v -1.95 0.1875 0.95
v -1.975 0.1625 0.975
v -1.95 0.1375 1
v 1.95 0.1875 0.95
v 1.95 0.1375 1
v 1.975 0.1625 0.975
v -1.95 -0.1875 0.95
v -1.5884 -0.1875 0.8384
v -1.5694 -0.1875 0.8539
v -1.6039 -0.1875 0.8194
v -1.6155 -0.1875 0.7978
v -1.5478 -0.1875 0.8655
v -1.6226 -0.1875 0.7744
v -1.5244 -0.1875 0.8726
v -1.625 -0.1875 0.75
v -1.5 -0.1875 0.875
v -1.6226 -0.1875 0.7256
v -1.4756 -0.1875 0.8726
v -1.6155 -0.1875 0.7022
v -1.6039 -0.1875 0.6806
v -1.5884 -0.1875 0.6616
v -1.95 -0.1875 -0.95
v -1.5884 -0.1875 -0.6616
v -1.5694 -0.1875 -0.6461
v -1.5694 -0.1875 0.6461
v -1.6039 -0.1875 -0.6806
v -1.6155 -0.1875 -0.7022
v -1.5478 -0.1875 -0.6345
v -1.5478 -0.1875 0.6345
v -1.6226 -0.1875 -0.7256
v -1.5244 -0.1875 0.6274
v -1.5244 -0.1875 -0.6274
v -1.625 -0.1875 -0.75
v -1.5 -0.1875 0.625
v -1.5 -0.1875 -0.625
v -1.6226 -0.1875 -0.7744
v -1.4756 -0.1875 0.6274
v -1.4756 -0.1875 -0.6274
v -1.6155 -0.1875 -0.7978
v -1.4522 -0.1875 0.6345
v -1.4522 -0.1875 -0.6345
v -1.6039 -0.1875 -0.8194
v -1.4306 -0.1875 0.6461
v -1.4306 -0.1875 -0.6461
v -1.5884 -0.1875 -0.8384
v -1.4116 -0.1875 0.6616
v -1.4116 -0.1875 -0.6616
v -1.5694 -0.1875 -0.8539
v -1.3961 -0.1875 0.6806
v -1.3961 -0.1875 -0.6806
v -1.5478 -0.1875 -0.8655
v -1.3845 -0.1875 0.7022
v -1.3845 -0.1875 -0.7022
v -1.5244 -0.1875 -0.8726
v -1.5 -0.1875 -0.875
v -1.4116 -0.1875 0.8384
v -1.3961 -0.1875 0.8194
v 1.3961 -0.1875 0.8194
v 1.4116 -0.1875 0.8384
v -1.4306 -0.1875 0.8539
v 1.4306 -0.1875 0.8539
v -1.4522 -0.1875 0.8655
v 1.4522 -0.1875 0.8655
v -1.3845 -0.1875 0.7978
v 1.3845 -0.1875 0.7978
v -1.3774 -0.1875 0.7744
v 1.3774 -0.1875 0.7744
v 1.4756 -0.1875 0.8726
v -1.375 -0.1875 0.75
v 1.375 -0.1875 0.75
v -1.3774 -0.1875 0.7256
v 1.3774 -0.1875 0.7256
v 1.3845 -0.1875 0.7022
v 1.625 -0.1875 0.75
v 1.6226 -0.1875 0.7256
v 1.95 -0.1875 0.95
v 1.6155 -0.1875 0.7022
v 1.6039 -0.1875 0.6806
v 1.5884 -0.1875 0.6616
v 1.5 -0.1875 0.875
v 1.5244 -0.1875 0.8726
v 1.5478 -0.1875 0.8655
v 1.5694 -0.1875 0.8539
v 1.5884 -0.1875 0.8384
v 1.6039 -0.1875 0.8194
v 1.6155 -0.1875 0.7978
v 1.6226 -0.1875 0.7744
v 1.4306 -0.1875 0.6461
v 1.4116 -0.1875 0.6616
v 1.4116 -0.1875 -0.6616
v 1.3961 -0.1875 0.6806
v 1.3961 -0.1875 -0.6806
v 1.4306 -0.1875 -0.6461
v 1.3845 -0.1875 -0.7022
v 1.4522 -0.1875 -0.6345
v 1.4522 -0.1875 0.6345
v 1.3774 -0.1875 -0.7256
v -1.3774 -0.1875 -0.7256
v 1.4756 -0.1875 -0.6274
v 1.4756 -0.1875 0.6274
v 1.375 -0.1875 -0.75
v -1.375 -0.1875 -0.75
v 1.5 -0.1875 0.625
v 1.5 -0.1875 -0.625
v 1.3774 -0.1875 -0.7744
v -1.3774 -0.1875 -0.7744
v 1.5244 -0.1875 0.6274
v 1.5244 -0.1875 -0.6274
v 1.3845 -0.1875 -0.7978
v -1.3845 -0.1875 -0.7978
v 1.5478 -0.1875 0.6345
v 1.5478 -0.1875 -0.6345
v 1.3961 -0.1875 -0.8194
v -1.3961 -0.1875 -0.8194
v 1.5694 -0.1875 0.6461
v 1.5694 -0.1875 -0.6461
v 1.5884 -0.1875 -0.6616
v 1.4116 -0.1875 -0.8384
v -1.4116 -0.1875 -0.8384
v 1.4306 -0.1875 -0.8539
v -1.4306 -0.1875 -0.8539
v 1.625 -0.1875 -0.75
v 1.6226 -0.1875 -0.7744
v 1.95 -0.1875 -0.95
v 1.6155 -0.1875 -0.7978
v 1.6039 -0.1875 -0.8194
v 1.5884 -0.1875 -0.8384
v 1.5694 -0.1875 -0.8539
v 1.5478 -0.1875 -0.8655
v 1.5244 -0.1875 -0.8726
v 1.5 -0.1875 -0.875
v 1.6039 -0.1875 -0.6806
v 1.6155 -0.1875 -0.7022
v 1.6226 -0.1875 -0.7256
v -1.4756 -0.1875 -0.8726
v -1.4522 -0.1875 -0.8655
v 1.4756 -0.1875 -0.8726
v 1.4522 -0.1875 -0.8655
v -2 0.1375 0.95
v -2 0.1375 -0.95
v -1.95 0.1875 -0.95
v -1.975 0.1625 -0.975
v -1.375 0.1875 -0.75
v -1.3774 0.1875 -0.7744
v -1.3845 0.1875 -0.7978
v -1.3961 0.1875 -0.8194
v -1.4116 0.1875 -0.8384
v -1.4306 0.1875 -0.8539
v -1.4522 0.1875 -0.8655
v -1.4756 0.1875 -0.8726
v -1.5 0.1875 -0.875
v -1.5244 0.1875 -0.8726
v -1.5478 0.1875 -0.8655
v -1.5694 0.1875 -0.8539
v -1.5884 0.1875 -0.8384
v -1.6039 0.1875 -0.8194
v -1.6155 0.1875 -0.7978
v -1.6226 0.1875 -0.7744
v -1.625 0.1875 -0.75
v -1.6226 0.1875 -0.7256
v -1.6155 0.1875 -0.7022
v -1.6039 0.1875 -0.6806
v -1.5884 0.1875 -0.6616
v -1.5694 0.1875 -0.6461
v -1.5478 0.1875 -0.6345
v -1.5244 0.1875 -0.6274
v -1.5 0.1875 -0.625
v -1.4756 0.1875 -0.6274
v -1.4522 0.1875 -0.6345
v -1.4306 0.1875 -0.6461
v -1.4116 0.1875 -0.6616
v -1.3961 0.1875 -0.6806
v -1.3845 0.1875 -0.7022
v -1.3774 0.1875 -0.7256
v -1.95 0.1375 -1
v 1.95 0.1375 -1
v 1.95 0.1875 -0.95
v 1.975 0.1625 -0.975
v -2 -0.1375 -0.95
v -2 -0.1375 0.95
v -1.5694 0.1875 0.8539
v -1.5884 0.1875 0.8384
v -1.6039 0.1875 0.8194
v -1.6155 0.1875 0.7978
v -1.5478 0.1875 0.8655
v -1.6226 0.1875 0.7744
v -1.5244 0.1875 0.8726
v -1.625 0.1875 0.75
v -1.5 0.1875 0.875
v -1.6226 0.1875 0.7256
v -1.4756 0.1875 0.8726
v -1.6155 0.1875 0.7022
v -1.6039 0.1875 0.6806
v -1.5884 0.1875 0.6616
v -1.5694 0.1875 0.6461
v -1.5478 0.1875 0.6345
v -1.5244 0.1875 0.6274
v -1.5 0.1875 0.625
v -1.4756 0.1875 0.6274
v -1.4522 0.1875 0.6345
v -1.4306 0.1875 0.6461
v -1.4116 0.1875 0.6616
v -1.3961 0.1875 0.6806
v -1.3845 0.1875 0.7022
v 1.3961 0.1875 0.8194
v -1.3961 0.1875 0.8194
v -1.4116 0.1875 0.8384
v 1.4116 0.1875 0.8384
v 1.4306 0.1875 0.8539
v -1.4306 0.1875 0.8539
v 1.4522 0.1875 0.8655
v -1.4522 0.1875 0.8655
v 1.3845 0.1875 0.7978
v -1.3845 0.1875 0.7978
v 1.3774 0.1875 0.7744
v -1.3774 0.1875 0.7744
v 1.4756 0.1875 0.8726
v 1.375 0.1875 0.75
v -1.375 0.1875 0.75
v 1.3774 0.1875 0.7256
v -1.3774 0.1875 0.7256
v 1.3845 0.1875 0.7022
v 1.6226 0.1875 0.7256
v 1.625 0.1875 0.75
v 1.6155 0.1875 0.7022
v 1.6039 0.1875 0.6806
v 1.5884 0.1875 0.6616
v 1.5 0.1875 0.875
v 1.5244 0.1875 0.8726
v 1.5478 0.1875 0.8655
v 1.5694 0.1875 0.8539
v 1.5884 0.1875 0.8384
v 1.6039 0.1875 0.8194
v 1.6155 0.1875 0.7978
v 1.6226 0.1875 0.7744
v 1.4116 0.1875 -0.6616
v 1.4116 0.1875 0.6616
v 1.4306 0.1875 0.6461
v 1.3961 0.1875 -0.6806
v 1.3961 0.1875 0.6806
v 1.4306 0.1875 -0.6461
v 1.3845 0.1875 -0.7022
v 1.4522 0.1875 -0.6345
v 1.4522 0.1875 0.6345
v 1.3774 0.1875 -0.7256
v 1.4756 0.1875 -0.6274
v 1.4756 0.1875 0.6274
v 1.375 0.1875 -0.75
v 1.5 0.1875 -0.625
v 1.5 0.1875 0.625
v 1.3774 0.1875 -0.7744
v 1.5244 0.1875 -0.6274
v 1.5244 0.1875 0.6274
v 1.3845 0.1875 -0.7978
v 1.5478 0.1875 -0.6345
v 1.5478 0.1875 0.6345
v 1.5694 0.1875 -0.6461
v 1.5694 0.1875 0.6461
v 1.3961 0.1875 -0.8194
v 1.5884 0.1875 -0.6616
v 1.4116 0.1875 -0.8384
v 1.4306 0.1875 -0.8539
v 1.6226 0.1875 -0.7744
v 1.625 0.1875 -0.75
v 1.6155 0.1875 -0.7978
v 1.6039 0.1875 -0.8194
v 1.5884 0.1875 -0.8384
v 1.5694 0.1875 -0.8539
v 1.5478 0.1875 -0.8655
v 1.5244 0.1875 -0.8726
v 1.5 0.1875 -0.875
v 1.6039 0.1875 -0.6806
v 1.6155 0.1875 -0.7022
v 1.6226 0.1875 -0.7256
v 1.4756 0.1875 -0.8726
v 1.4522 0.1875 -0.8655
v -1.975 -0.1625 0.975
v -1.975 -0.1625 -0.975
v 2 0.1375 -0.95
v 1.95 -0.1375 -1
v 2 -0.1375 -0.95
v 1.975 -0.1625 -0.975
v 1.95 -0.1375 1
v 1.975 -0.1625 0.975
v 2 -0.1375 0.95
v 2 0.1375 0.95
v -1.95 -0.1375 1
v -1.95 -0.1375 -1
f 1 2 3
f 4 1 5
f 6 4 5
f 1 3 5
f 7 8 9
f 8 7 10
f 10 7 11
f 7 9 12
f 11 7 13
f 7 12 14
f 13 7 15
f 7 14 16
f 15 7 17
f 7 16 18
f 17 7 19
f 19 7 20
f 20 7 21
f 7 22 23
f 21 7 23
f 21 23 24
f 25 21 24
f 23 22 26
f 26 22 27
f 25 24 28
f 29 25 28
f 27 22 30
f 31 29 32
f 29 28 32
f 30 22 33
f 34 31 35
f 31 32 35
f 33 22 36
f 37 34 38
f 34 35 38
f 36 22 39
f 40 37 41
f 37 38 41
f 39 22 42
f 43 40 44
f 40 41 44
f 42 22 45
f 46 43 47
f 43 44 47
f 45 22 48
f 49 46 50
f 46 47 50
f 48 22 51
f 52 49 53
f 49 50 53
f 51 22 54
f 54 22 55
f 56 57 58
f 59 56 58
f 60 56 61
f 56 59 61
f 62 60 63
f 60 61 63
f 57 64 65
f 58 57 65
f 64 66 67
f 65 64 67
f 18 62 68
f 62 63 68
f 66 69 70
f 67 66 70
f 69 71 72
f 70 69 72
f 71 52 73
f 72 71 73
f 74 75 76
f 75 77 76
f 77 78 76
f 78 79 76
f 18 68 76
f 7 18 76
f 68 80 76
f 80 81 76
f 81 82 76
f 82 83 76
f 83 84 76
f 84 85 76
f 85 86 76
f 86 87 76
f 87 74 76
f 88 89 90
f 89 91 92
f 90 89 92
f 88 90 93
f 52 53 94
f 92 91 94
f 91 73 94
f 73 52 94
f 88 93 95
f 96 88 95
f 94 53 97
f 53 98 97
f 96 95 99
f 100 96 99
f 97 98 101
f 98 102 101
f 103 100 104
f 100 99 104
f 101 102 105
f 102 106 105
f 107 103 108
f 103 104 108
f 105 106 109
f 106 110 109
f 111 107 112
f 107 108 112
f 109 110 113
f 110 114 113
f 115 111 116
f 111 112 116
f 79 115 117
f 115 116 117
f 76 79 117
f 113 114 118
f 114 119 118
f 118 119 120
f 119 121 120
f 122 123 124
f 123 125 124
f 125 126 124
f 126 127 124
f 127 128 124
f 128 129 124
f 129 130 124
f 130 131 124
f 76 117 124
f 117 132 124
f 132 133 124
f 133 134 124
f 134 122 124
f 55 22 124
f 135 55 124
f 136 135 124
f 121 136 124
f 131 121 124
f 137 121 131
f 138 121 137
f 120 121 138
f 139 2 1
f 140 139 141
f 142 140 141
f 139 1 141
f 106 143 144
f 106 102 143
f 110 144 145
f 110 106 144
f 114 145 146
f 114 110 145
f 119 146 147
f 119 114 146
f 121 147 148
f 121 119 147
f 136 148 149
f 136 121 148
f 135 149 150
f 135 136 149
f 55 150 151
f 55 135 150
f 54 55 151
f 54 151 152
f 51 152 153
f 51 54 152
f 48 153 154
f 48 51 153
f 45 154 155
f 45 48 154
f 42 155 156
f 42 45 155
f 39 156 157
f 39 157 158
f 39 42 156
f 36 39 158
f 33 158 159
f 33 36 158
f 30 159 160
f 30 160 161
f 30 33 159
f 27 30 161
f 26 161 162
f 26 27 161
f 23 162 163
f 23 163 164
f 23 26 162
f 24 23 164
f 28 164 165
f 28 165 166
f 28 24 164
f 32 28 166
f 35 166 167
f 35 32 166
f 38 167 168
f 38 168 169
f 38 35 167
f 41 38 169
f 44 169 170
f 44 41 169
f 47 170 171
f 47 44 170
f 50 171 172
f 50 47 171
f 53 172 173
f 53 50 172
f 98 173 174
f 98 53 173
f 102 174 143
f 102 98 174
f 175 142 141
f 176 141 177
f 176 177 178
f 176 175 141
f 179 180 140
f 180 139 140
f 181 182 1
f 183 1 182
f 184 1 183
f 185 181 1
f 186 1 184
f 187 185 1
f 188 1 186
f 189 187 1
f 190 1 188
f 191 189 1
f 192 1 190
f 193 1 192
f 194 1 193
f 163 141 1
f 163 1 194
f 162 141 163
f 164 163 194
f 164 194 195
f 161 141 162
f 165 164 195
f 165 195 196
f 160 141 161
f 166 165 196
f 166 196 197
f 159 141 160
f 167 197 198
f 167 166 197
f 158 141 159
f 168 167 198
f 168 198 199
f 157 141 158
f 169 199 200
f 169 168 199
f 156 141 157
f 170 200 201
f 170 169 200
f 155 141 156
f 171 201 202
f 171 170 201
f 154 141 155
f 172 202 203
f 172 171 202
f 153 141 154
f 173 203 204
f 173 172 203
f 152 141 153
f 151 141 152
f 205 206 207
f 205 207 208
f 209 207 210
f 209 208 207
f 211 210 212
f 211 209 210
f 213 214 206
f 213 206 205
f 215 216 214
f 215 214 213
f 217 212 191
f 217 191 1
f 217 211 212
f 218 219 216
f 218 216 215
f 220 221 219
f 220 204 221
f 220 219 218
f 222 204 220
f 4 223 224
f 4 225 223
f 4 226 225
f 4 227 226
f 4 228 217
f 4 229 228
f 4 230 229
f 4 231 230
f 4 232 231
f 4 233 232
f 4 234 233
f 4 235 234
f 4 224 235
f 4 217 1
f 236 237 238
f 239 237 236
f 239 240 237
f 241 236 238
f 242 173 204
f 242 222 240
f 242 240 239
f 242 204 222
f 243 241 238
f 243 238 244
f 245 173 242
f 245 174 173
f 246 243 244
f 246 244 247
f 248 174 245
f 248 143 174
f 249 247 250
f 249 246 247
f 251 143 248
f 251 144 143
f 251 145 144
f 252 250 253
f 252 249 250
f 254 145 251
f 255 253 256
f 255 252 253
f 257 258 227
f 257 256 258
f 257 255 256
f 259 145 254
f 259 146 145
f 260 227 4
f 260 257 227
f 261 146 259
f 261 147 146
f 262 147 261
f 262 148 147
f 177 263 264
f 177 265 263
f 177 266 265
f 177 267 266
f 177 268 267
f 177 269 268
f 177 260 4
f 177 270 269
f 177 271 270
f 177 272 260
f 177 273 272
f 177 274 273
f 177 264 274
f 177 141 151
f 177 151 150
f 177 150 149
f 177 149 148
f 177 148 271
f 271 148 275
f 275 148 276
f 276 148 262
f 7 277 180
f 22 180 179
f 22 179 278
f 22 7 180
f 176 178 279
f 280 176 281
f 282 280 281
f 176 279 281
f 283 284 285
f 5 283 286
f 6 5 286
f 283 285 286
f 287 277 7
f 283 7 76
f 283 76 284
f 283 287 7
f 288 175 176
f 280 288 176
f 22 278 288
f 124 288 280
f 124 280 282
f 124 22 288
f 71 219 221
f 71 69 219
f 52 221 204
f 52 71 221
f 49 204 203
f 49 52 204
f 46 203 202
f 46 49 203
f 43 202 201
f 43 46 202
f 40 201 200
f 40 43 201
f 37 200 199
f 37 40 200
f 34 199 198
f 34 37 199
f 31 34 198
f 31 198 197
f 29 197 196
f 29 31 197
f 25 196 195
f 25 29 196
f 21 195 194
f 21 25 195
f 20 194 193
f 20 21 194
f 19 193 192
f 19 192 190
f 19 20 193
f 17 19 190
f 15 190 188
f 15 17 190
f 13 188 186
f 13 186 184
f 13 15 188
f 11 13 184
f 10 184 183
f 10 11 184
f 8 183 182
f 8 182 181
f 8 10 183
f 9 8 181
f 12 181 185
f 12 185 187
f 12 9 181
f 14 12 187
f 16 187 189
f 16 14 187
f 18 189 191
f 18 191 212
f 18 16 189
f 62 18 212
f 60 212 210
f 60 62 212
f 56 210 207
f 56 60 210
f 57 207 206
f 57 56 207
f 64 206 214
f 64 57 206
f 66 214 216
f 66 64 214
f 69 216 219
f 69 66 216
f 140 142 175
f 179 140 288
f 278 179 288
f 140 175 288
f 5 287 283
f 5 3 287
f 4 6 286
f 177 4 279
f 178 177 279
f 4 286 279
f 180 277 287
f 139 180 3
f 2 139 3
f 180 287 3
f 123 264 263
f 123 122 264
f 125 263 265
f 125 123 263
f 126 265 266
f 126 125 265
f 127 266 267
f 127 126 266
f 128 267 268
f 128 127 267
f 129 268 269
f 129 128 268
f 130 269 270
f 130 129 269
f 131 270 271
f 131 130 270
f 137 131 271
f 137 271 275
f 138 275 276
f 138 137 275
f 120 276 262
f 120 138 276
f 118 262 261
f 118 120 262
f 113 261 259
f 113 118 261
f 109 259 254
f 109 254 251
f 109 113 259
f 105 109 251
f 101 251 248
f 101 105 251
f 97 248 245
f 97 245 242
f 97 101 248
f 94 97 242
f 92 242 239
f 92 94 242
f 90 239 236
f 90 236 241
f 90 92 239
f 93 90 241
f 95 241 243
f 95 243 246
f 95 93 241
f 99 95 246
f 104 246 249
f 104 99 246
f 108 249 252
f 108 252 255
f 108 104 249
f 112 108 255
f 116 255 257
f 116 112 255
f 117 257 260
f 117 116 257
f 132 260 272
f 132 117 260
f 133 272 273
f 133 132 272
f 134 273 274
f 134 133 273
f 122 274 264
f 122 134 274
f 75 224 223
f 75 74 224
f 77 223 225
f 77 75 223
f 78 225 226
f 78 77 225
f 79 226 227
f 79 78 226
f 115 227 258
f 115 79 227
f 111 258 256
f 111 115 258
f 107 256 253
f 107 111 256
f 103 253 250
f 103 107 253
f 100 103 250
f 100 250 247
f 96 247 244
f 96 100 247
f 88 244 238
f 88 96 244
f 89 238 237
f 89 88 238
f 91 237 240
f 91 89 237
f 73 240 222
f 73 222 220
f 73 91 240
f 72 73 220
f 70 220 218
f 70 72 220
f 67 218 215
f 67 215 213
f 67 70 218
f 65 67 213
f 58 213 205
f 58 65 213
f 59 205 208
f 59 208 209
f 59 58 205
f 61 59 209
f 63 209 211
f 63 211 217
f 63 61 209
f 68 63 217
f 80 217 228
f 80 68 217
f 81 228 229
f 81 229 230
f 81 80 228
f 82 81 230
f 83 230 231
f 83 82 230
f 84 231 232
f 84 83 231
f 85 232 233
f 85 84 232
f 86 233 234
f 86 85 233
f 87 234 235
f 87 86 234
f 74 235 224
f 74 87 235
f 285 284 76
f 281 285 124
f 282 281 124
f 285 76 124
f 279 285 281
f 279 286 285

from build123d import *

# Parameters (mm, degrees)
SKETCH1_W           = 4
SKETCH1_H           = 2
SKETCH1_R           = 0.125
BOSS_EXTRUDE1_DEPTH = 0.1875
CHAMFER1_SIZE       = 0.05
CHAMFER2_SIZE       = 0.05


with BuildPart() as part:
    # Sketch1 → Boss-Extrude1 (new body, symmetric)
    with BuildSketch(Plane(origin=(0, 0, 0), x_dir=(1, 0, 0), z_dir=(0, 1, 0))):
        Rectangle(SKETCH1_W, SKETCH1_H)
        with Locations((-1.5, 0.75)):
            Circle(SKETCH1_R, mode=Mode.SUBTRACT)
        with Locations((1.5, 0.75)):
            Circle(SKETCH1_R, mode=Mode.SUBTRACT)
        with Locations((1.5, -0.75)):
            Circle(SKETCH1_R, mode=Mode.SUBTRACT)
        with Locations((-1.5, -0.75)):
            Circle(SKETCH1_R, mode=Mode.SUBTRACT)
    extrude(amount=BOSS_EXTRUDE1_DEPTH, both=True)

    # Chamfer1
    chamfer1_edges = [part.edges().sort_by_distance(p)[0] for p in [
        (2, 0.1875, 0),
        (0, 0.1875, -1),
        (-2, 0.1875, 0),
        (0, -0.1875, -1),
        (2, -0.1875, 0),
        (0, -0.1875, 1),
        (-2, -0.1875, 0),
        (0, 0.1875, 1),
    ]]
    chamfer(chamfer1_edges, length=CHAMFER1_SIZE)

    # Chamfer2
    chamfer2_edges = [part.edges().sort_by_distance(p)[0] for p in [
        (-2, 0, 1),
        (-2, 0, -1),
        (2, 0, 1),
        (2, 0, -1),
    ]]
    chamfer(chamfer2_edges, length=CHAMFER2_SIZE)


solid = part.part
